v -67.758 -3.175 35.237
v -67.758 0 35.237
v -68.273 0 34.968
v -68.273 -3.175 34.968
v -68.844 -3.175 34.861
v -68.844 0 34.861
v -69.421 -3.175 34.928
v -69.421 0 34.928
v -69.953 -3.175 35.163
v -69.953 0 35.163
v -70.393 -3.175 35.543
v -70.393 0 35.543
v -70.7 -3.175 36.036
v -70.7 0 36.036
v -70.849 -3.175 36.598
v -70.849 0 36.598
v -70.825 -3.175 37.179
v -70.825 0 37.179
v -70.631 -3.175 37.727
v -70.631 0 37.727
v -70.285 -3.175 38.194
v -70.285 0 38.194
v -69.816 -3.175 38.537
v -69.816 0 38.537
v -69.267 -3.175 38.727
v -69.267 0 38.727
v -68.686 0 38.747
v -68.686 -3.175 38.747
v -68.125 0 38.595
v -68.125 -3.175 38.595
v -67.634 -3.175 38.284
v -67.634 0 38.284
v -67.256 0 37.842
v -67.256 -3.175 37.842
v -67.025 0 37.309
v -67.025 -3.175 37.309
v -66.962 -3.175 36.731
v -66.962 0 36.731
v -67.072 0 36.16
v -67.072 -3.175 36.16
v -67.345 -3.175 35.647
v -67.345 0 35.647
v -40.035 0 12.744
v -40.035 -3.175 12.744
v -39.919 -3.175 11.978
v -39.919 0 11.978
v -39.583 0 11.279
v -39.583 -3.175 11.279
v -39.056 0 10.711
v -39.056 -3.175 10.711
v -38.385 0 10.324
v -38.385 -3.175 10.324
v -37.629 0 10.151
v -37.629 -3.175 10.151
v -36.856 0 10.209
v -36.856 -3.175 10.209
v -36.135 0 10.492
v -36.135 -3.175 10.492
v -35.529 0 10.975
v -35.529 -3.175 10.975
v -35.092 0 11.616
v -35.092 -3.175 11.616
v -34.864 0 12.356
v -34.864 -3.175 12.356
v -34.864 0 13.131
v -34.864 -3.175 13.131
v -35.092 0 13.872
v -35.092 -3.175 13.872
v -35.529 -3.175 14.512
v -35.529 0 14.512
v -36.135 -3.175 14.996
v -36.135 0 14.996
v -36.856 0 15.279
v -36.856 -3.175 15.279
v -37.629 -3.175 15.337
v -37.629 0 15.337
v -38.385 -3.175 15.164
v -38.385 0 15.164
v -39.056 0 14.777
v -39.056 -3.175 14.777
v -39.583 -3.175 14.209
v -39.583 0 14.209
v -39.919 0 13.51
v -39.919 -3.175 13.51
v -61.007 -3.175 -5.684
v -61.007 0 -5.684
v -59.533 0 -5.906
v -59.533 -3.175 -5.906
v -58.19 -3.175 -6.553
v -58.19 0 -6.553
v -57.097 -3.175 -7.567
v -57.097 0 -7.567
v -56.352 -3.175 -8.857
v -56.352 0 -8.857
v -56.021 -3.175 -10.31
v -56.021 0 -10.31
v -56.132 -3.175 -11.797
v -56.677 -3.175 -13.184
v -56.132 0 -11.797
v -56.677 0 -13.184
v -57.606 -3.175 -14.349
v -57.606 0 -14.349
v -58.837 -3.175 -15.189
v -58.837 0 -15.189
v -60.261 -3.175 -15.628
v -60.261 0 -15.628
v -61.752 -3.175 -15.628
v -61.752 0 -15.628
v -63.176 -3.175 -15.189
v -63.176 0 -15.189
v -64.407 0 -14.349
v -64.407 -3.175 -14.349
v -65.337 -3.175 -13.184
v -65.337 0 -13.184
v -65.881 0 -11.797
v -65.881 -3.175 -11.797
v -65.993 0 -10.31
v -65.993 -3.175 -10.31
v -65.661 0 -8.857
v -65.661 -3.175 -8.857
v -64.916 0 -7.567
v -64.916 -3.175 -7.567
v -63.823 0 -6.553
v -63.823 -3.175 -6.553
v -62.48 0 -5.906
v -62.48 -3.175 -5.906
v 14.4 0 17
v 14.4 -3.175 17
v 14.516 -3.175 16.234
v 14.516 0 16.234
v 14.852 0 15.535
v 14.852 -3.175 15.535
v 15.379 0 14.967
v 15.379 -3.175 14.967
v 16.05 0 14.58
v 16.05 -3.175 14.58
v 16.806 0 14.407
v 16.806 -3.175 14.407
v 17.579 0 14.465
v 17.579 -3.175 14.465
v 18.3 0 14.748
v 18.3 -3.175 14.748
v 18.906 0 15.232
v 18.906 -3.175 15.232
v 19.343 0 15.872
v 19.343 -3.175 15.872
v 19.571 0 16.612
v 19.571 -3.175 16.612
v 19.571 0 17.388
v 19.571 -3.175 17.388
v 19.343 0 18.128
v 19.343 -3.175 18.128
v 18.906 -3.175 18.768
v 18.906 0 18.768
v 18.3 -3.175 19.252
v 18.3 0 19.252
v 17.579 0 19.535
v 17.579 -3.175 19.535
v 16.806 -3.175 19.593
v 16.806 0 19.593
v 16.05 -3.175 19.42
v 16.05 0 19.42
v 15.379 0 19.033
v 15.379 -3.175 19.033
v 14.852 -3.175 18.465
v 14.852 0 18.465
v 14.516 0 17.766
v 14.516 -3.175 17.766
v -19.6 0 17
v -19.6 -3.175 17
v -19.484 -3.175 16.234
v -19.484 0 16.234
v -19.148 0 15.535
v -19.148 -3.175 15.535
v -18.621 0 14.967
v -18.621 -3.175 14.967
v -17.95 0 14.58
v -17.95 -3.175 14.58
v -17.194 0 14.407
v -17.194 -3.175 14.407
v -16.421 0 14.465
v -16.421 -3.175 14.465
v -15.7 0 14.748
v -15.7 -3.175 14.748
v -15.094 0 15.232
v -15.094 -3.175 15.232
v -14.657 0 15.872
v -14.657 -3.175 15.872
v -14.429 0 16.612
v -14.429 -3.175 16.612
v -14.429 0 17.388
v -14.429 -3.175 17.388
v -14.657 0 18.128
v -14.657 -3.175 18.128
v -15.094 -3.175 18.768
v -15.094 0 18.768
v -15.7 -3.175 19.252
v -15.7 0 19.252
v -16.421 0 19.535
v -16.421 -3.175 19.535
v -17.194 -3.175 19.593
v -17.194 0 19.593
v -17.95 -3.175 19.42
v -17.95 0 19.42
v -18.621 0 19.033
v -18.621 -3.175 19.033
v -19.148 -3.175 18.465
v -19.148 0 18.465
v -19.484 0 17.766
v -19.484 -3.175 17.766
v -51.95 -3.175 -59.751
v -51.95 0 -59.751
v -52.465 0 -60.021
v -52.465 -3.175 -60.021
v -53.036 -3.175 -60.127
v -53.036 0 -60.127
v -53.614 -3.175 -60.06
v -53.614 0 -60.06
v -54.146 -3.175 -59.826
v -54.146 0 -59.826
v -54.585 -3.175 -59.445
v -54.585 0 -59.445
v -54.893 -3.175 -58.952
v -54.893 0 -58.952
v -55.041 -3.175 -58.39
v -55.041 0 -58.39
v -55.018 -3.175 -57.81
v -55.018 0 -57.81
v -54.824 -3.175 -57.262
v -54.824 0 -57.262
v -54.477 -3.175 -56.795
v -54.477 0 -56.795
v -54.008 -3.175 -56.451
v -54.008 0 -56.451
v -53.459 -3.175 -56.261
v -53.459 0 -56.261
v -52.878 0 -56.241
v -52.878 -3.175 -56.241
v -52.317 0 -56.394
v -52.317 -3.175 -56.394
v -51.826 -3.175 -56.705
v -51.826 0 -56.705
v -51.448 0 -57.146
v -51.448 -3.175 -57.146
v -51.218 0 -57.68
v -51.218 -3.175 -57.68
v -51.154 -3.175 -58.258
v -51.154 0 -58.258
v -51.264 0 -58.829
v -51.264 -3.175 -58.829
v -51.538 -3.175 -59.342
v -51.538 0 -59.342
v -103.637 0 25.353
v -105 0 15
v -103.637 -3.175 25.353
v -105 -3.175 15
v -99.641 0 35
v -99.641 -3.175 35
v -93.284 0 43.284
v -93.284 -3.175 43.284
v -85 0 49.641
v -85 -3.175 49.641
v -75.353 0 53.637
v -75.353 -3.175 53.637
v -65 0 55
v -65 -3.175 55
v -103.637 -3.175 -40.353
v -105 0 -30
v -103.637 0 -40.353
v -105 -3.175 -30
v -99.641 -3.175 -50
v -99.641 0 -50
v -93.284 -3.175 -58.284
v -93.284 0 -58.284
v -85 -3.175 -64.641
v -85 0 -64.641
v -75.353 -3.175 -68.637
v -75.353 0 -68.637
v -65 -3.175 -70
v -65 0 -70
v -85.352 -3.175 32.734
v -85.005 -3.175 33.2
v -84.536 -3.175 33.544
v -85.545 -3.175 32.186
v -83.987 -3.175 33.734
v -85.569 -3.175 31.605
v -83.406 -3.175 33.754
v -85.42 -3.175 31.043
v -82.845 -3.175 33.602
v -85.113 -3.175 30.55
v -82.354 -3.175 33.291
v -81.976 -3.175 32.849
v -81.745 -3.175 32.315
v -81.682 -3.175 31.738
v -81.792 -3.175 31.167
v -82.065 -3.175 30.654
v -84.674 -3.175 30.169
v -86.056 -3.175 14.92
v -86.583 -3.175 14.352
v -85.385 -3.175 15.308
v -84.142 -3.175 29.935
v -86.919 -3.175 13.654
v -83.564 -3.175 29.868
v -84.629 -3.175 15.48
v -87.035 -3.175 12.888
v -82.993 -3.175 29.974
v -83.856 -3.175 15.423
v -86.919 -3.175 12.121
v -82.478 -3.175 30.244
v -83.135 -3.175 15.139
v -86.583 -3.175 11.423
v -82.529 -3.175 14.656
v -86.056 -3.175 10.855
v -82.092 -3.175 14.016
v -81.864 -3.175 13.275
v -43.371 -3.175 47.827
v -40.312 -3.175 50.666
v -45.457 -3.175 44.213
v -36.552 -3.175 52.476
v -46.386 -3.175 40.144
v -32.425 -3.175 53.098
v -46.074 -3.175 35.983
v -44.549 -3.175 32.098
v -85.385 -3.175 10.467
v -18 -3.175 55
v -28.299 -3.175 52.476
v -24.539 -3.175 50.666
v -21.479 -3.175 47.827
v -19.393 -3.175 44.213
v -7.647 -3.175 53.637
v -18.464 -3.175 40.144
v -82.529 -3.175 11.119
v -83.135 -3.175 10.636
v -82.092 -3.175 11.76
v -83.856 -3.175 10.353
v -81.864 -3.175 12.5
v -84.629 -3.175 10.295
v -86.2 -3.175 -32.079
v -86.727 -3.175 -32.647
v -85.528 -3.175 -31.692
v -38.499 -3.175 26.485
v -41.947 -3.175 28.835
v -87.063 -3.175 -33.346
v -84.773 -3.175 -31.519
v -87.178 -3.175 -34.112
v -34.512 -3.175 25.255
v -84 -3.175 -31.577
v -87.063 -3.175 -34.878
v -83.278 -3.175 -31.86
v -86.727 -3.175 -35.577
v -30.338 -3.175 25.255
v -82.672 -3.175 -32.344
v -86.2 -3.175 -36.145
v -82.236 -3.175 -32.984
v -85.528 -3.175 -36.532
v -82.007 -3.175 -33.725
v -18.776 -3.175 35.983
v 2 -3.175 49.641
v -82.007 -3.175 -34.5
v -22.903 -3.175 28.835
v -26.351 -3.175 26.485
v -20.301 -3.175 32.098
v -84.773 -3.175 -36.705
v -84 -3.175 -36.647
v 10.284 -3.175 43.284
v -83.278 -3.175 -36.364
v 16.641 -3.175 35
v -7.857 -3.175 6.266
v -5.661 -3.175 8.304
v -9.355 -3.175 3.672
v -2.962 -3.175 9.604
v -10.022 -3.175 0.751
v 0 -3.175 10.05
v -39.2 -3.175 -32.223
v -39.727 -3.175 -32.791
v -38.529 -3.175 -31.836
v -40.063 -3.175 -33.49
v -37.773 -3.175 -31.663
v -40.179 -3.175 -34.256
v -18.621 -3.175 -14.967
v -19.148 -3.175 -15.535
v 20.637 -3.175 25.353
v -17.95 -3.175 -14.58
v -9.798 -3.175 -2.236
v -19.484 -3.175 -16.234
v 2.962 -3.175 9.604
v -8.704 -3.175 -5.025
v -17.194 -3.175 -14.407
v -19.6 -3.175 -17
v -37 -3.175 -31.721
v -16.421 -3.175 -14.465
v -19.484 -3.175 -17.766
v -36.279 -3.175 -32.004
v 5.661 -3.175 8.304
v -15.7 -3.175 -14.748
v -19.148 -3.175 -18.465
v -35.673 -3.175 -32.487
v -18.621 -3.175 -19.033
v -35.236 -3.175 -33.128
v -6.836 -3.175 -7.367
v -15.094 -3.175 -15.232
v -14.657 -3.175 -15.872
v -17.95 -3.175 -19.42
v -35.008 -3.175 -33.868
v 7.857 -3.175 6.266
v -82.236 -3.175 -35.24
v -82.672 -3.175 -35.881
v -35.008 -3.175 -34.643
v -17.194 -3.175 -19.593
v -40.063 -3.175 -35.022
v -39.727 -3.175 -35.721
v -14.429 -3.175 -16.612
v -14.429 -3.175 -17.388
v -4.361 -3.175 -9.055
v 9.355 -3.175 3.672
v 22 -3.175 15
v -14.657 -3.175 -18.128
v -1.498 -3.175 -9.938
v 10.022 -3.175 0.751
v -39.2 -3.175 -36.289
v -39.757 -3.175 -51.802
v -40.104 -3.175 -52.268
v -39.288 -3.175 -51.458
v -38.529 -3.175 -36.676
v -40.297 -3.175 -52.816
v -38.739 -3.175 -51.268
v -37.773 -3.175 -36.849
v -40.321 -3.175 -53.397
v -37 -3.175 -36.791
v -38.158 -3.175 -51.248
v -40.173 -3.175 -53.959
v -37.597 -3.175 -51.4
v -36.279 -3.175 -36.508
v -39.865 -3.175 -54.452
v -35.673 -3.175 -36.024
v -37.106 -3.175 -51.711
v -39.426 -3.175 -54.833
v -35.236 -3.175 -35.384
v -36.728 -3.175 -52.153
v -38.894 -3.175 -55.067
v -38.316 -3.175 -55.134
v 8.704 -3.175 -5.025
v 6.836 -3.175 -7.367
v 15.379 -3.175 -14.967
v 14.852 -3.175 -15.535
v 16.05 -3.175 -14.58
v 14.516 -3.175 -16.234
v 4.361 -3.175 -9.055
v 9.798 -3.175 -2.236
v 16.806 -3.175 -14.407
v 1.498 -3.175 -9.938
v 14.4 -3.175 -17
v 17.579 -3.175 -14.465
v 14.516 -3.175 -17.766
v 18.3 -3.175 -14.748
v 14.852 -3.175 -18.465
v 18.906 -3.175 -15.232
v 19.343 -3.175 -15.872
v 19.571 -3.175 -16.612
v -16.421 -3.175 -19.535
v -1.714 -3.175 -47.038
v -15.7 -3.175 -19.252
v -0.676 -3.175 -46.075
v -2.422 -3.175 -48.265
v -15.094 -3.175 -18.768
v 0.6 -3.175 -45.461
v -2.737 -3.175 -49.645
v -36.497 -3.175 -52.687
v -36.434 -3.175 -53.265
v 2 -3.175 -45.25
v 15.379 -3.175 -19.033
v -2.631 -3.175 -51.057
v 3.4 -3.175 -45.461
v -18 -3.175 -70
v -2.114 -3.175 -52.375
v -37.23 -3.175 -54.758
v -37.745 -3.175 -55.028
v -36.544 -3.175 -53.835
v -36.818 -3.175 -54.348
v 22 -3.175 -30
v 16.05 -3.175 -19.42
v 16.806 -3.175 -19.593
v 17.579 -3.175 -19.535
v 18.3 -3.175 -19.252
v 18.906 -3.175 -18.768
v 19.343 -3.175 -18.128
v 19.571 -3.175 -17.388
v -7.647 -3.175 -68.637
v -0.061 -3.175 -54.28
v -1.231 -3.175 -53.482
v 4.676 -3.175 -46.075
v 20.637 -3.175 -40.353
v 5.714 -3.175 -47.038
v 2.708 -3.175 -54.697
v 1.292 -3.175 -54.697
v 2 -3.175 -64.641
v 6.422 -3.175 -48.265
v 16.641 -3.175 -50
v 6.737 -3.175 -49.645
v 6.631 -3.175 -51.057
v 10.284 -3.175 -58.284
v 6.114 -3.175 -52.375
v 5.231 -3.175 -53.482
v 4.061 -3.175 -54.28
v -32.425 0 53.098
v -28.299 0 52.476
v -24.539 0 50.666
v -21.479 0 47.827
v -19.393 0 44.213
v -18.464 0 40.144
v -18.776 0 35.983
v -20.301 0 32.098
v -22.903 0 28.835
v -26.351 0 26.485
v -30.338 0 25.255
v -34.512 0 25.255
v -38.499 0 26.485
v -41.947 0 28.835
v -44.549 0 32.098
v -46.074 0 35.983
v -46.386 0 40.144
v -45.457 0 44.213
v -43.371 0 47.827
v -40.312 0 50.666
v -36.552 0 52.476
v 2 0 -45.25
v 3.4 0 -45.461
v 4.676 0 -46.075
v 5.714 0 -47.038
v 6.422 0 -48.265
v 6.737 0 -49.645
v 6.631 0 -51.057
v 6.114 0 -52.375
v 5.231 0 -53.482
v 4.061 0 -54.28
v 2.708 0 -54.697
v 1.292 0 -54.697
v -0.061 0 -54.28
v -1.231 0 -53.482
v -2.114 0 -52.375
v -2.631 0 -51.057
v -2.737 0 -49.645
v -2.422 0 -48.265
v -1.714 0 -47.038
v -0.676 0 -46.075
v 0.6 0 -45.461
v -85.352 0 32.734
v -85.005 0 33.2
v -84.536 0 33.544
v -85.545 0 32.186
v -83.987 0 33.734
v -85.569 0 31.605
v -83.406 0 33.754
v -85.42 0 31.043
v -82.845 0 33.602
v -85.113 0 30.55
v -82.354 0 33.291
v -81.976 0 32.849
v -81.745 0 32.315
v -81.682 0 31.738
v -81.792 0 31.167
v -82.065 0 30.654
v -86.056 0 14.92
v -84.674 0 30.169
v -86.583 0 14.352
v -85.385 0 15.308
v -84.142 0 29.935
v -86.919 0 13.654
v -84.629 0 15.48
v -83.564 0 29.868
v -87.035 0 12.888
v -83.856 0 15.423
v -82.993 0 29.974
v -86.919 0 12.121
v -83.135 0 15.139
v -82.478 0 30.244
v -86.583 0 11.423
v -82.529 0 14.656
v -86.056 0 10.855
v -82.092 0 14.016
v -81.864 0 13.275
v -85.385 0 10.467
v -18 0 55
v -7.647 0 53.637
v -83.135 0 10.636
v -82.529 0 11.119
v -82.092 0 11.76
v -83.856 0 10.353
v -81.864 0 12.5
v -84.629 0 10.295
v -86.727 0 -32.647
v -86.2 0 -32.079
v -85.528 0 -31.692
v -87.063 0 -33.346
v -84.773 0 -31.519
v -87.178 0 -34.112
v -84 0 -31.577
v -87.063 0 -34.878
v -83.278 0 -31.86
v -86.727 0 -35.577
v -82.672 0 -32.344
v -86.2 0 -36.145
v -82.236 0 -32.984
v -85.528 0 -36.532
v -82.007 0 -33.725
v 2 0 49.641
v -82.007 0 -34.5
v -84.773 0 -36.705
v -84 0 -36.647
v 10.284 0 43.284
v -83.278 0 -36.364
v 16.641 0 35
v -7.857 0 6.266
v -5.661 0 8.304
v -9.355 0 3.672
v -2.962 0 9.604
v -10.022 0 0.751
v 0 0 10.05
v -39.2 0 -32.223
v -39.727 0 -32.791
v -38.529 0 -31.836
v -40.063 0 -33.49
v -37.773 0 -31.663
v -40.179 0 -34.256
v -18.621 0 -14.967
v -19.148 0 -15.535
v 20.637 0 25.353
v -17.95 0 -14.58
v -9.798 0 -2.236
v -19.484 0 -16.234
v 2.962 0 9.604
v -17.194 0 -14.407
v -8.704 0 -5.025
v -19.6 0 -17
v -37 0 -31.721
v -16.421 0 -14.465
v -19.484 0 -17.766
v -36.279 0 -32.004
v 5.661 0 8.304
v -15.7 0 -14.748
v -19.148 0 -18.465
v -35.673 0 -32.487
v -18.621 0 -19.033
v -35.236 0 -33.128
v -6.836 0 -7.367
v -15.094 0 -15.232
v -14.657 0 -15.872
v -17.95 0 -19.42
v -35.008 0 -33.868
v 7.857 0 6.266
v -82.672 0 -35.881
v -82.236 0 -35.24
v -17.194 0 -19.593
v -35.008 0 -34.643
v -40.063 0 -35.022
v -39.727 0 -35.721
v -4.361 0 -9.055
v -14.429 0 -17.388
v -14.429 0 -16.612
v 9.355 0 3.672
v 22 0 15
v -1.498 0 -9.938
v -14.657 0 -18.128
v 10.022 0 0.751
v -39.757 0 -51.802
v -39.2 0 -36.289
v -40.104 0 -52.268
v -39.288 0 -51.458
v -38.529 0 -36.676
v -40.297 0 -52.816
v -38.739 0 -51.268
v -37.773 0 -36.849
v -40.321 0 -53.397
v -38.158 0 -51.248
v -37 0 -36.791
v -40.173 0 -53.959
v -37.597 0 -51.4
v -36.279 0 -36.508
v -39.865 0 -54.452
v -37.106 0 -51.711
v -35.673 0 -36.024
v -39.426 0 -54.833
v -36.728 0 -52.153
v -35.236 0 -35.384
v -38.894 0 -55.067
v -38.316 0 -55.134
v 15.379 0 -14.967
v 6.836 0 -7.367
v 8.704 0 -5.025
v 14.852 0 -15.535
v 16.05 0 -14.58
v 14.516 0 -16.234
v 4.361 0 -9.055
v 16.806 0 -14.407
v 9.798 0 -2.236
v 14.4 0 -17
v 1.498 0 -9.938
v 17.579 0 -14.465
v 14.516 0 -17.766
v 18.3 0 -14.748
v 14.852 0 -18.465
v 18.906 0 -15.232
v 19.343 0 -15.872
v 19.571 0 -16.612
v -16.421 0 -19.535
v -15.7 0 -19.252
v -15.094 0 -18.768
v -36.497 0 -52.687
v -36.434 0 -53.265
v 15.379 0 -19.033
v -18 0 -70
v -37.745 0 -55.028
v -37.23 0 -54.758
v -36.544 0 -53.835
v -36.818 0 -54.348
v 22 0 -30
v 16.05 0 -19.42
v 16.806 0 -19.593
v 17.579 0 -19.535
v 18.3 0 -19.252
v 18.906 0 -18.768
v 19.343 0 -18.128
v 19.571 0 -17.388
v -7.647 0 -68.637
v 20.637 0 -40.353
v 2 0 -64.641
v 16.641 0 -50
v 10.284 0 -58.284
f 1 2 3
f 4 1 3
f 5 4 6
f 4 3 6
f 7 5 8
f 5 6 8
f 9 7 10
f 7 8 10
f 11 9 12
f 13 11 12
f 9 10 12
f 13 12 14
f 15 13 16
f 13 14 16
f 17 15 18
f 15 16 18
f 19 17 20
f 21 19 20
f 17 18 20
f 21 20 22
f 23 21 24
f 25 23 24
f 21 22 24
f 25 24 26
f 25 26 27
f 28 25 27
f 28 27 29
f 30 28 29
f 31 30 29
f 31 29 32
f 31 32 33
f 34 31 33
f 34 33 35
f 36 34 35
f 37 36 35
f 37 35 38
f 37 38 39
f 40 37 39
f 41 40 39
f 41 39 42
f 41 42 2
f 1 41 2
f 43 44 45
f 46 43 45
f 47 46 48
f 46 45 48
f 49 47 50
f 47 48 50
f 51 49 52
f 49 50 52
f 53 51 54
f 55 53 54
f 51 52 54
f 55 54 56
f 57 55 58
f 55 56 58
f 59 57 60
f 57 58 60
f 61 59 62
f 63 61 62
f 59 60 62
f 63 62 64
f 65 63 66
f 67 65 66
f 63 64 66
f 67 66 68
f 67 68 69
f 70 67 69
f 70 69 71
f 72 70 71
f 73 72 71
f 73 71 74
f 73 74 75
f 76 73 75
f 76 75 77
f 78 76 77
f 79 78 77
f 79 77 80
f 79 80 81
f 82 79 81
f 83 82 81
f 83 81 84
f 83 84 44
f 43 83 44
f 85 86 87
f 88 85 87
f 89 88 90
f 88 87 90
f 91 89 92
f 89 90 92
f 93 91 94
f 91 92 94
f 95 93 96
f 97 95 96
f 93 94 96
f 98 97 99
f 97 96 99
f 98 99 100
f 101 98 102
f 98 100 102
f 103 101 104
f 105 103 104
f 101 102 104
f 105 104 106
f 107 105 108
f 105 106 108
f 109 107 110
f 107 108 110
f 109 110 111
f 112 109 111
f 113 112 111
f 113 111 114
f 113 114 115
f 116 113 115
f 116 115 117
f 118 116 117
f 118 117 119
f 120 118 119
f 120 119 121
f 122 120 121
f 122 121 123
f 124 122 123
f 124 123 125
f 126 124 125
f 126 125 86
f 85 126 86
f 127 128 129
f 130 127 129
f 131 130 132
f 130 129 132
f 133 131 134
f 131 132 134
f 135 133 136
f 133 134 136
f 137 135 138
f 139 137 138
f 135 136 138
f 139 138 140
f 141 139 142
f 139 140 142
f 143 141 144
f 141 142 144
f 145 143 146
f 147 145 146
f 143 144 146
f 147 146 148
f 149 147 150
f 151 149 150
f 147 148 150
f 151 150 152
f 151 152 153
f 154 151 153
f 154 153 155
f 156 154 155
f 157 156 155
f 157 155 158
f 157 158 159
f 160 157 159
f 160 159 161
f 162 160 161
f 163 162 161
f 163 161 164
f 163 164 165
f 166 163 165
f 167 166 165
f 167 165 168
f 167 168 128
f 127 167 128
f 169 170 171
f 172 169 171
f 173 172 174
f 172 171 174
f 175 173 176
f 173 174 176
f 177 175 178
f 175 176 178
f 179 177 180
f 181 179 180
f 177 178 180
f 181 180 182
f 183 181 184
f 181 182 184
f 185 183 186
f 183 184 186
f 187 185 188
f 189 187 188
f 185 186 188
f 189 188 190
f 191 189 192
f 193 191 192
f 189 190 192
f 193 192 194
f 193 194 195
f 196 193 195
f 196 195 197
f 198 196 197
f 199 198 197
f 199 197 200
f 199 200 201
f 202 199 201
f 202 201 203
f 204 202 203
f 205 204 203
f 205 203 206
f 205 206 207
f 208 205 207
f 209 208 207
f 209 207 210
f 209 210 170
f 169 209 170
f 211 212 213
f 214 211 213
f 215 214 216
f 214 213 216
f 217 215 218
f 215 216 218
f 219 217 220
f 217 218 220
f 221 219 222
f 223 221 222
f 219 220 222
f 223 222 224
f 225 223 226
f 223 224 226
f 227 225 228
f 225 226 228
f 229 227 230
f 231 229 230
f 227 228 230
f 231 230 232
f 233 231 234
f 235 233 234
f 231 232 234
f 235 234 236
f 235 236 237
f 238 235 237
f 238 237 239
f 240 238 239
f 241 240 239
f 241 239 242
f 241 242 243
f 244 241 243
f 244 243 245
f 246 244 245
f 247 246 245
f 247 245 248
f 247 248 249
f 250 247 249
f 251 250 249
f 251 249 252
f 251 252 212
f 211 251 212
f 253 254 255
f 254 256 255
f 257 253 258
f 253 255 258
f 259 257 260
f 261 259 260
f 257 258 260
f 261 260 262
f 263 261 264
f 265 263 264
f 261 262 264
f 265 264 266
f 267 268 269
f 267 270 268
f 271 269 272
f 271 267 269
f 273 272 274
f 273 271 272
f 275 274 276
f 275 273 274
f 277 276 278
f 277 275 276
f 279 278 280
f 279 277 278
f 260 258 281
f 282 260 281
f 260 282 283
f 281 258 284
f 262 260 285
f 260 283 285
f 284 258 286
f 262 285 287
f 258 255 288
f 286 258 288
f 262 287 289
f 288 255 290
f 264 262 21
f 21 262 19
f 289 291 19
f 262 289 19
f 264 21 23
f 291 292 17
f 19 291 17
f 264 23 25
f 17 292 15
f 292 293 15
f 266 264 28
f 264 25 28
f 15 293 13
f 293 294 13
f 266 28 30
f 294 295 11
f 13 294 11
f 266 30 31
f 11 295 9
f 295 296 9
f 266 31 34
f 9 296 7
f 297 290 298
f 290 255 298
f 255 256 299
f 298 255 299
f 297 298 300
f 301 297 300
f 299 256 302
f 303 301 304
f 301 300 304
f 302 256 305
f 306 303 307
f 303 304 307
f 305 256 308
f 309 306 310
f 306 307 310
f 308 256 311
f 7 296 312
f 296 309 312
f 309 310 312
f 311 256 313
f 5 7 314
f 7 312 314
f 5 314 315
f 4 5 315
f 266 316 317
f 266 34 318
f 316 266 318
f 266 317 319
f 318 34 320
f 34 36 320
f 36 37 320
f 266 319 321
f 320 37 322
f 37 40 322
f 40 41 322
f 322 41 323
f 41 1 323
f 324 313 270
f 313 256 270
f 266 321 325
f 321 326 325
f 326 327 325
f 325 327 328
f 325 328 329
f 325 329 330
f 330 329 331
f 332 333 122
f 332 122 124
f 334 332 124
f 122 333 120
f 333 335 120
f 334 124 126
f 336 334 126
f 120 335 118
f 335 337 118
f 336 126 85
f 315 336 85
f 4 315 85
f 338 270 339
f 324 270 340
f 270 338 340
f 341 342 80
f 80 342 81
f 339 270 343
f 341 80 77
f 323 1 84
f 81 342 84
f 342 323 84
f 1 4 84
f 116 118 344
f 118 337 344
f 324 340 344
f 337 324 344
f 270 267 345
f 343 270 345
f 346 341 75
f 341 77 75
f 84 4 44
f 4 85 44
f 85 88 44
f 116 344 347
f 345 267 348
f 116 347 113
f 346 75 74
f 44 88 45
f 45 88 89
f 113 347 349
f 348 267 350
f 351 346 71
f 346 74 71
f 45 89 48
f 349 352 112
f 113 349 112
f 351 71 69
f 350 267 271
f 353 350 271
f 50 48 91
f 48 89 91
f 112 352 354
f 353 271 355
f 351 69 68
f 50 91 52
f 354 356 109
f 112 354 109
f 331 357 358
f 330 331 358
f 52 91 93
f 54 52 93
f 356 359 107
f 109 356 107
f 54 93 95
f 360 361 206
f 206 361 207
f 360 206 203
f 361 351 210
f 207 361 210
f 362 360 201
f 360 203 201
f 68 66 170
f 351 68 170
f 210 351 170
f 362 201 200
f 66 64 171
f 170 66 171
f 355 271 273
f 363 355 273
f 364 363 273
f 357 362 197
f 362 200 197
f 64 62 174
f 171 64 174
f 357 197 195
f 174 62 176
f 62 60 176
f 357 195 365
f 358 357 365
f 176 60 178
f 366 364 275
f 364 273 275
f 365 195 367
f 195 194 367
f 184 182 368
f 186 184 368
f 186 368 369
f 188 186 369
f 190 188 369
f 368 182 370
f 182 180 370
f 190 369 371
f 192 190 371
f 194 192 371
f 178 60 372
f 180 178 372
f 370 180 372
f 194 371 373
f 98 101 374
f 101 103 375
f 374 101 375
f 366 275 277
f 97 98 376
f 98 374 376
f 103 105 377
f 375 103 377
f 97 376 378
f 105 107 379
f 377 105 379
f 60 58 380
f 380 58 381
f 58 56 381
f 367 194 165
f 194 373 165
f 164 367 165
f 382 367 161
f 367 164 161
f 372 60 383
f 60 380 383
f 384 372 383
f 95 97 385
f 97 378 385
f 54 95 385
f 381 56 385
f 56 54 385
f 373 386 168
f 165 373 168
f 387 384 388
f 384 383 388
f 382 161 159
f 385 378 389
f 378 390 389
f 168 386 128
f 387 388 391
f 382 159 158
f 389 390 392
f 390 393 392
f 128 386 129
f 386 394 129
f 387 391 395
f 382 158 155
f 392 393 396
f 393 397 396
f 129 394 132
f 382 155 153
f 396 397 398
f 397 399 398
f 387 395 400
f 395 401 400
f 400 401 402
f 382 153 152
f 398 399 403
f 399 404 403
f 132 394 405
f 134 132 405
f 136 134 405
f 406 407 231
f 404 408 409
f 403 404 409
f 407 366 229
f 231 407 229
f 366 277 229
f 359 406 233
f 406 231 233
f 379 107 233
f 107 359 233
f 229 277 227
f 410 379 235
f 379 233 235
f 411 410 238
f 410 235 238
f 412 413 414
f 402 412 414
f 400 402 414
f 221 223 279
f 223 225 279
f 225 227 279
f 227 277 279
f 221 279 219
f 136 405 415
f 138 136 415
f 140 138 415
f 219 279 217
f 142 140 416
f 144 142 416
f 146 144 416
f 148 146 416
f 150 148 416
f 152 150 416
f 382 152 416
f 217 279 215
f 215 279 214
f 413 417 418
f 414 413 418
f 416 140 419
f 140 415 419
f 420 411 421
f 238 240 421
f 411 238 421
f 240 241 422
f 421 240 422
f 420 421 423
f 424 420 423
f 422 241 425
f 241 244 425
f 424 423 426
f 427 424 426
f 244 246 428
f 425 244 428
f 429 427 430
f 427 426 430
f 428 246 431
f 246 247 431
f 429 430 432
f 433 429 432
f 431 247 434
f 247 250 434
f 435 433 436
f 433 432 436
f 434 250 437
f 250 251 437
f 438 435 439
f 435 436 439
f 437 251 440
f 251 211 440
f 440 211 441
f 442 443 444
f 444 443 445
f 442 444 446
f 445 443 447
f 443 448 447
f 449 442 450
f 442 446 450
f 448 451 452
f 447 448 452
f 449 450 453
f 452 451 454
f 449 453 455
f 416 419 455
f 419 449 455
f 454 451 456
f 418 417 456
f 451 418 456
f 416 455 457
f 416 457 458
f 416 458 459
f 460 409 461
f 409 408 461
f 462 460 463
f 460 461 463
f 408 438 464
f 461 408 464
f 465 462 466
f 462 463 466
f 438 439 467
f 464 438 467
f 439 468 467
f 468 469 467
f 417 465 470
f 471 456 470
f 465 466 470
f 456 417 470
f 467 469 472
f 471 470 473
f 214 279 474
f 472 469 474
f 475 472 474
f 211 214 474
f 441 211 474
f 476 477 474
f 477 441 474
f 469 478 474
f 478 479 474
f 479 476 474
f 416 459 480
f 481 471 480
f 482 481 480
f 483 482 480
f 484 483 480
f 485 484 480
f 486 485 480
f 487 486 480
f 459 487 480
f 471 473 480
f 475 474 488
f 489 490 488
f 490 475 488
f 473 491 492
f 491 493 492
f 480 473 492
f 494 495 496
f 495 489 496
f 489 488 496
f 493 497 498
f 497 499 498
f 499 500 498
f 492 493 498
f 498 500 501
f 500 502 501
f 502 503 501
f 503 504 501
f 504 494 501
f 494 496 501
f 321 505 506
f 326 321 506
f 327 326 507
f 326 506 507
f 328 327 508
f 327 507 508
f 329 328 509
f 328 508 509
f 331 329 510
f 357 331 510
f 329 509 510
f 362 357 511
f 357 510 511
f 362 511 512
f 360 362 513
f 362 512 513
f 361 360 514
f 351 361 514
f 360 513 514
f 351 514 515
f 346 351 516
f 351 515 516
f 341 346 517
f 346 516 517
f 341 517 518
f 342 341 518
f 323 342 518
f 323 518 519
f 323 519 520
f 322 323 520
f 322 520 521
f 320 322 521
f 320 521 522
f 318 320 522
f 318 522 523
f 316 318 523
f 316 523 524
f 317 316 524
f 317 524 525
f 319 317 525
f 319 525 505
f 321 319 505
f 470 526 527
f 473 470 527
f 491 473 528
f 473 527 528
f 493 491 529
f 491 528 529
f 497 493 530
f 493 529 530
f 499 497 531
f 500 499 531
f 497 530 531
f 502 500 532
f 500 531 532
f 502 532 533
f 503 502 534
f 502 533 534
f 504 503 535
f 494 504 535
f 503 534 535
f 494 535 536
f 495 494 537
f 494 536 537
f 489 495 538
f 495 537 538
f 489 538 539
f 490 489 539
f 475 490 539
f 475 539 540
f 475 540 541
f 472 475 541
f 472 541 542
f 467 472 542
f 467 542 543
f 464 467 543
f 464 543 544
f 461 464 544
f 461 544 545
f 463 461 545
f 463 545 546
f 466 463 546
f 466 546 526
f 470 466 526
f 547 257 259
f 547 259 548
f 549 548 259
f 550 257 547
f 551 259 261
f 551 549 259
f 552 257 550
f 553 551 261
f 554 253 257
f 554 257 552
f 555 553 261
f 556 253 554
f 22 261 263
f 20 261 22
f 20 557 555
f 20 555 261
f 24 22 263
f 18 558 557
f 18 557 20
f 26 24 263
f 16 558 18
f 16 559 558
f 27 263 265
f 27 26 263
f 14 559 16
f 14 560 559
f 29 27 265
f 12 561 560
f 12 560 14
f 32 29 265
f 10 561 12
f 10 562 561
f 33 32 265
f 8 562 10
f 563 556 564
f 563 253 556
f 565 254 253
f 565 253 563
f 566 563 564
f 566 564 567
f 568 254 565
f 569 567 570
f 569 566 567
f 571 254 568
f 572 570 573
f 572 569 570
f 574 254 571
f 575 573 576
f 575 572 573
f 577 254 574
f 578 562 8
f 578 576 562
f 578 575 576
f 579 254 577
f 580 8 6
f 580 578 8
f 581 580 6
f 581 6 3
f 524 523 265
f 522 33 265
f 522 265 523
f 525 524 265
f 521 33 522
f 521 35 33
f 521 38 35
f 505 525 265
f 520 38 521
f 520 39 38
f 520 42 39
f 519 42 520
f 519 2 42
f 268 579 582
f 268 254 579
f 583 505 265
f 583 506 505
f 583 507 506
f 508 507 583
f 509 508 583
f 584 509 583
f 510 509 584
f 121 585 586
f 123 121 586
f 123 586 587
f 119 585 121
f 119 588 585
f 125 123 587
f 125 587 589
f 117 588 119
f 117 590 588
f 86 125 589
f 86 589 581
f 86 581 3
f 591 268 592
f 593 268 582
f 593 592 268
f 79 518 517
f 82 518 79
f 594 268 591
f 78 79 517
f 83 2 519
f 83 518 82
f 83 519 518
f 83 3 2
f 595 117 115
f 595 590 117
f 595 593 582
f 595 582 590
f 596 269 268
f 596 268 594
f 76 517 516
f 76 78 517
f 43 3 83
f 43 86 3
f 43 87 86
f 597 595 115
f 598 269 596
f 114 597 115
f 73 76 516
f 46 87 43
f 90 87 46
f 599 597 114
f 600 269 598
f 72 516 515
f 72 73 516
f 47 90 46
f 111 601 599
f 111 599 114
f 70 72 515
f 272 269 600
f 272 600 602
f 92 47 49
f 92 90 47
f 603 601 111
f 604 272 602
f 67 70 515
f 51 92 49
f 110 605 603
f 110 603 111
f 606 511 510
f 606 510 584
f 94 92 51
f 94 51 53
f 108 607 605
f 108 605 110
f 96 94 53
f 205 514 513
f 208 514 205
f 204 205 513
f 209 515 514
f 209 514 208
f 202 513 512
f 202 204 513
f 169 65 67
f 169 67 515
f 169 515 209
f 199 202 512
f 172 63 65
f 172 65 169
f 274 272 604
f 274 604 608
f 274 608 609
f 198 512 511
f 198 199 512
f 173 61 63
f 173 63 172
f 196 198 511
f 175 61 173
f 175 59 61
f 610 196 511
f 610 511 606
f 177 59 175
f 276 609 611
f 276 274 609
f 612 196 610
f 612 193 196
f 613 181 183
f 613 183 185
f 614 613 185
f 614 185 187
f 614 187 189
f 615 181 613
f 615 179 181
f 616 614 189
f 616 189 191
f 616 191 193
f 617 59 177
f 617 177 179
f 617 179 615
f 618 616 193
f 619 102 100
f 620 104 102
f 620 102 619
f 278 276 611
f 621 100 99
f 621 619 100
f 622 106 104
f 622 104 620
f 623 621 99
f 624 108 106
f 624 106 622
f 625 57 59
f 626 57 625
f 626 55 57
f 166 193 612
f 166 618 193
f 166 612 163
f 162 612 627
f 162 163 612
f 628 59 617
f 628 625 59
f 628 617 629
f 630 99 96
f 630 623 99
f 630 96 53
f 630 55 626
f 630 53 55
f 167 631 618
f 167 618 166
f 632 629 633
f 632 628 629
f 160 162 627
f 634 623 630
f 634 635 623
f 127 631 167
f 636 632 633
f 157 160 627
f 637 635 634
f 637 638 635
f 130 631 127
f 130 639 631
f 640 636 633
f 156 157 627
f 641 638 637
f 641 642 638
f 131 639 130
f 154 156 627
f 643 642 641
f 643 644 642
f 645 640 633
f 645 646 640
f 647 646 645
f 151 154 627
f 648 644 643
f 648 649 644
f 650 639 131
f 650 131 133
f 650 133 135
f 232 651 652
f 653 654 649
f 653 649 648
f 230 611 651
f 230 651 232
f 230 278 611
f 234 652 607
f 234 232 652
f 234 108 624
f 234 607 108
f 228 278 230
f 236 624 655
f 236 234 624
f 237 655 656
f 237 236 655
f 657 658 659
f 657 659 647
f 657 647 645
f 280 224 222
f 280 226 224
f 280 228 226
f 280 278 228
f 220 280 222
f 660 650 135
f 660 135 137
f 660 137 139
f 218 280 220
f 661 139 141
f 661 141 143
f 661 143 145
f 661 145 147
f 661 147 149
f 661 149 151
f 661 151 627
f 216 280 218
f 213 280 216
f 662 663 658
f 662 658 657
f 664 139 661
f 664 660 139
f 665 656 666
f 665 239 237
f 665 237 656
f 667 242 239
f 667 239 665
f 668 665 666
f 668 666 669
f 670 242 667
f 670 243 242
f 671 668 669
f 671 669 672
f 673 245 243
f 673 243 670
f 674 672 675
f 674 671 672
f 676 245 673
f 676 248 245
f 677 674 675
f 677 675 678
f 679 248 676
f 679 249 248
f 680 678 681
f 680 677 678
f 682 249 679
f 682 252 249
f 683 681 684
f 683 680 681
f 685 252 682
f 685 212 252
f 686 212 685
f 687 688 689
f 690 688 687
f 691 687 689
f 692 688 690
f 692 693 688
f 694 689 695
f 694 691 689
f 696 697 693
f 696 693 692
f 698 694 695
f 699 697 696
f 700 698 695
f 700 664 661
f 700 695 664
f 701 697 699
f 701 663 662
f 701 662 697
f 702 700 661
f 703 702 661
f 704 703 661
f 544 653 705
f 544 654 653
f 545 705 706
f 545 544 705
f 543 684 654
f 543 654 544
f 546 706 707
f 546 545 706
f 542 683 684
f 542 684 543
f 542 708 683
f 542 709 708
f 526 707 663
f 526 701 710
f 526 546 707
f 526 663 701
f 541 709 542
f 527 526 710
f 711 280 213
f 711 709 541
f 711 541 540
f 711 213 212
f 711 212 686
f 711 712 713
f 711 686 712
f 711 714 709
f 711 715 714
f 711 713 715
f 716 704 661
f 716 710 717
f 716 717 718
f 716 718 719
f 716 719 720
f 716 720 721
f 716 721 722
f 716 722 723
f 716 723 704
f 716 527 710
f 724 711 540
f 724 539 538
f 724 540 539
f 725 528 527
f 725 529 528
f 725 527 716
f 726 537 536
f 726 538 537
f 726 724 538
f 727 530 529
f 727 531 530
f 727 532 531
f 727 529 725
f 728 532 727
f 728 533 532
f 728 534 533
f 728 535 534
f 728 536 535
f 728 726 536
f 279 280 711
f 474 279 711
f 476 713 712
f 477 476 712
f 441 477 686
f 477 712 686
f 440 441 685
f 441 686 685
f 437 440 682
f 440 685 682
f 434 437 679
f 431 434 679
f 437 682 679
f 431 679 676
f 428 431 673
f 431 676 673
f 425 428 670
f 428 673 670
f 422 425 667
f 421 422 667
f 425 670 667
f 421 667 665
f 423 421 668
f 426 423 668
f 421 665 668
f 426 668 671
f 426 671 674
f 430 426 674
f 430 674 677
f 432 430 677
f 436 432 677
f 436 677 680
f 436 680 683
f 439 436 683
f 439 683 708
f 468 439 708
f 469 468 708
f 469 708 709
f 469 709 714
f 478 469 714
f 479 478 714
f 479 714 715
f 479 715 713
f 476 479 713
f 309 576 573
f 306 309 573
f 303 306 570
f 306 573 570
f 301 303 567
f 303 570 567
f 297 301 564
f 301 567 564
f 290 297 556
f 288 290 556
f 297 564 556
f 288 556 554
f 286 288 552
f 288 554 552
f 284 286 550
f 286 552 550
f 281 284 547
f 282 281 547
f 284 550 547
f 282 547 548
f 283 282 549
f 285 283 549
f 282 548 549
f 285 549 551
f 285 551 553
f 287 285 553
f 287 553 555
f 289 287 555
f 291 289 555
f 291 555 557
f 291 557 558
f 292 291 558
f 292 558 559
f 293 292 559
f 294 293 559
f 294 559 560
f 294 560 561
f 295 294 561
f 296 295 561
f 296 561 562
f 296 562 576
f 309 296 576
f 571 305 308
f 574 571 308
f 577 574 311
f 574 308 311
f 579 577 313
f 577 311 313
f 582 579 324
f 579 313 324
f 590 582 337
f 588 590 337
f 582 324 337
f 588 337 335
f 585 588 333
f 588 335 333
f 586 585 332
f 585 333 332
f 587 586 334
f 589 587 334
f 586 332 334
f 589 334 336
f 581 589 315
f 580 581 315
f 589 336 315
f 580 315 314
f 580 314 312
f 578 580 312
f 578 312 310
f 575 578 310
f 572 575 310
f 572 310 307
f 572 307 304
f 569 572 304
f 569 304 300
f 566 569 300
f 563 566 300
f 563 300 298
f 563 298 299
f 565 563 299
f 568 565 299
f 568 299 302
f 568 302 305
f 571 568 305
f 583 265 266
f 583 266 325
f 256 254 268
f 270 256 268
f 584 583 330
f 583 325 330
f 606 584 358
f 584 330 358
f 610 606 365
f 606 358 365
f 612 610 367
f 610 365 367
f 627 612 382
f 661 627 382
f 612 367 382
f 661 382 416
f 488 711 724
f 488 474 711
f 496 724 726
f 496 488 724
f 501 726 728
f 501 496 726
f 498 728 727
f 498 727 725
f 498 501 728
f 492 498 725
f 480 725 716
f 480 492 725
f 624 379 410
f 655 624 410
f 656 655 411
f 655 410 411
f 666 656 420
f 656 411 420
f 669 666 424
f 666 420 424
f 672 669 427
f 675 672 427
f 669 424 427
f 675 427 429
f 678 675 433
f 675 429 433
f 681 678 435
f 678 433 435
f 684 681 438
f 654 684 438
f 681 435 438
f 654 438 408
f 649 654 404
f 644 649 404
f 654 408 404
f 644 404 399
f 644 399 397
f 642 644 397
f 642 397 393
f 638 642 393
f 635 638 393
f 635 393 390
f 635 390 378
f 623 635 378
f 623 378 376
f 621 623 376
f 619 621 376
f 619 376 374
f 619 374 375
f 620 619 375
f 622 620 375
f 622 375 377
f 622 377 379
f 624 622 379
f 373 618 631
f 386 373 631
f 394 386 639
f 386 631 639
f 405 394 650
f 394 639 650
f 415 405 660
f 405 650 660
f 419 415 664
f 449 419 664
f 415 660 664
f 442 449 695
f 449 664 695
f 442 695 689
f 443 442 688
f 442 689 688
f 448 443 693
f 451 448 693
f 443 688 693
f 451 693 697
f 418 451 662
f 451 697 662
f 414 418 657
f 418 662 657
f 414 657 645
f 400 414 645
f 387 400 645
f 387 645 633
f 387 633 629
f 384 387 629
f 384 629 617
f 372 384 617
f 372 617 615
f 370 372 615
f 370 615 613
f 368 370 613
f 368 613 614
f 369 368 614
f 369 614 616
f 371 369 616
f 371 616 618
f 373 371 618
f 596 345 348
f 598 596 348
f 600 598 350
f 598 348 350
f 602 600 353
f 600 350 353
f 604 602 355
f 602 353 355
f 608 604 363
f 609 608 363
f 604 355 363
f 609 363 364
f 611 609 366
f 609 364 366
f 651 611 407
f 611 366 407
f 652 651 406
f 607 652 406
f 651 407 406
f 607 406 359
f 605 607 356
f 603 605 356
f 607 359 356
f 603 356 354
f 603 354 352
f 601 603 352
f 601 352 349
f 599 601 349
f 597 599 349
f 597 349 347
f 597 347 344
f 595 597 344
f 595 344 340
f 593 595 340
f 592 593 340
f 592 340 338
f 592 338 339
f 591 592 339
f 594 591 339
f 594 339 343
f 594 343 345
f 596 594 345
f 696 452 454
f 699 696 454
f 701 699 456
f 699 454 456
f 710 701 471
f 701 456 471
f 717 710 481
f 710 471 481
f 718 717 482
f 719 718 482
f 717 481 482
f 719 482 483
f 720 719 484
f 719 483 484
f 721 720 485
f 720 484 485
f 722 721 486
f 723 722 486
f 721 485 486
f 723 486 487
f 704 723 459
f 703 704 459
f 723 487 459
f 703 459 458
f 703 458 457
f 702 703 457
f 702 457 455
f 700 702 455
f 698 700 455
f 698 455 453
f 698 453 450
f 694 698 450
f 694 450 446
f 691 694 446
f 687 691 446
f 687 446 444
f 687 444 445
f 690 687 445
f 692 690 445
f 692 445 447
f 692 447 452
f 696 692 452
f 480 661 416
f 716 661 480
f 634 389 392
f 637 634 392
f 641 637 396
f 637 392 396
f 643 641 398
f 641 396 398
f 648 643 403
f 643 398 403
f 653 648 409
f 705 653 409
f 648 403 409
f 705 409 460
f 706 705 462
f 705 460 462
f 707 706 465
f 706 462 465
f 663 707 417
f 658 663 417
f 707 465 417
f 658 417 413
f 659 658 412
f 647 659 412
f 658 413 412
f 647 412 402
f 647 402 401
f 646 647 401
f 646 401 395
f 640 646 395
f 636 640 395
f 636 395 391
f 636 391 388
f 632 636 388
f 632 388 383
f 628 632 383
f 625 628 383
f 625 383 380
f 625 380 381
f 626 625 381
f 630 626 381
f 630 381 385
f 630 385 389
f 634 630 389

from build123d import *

# Parameters (mm, degrees)
CROQUIS1_W                     = 127
CROQUIS1_H                     = 125
BRIDA_BASE1_DEPTH              = 3.175
CROQUIS11_R                    = 10.05
CORTAR_EXTRUIR3_DEPTH          = 10
TALADRO_DE_MARGEN_PARA_M51_D   = 5.2
TALADRO_DE_MARGEN_PARA_M52_D   = 5.2
CROQUIS16_R                    = 5
CORTAR_EXTRUIR4_DEPTH          = 127.234229213
CROQUIS17_R                    = 14
CROQUIS17_R_2                  = 4.75
CORTAR_EXTRUIR5_DEPTH          = 10
TALADRO_DE_MARGEN_PARA_M3_51_D = 3.9
REDONDEO1_R                    = 40


# Sheet-metal steps are written as plain solids
with BuildPart() as part:
    # Croquis1 → Brida base1 (new body)
    with BuildSketch(Plane(origin=(0, 0, 0), x_dir=(1, 0, 0), z_dir=(0, 1, 0))):
        with Locations((-41.5, 7.5)):
            Rectangle(CROQUIS1_W, CROQUIS1_H)
    extrude(amount=-BRIDA_BASE1_DEPTH)

    # Croquis11 → Cortar-Extruir3 (cut)
    with BuildSketch(Plane(origin=(0, 0, 0), x_dir=(1, 0, 0), z_dir=(0, 1, 0))):
        with Locations(Location((0, 0, 0), (0, 0, 270))):
            Circle(CROQUIS11_R)
    extrude(amount=-CORTAR_EXTRUIR3_DEPTH, mode=Mode.SUBTRACT)

    # Taladro de margen para M51 (through all)
    with Locations(Plane(origin=(0, 0, 0), x_dir=(1, 0, 0), z_dir=(0, 1, 0))):
        with Locations((17, 17), (-17, 17), (-17, -17), (17, -17)):
            Hole(TALADRO_DE_MARGEN_PARA_M51_D / 2)

    # Taladro de margen para M52 (through all)
    with Locations(Plane(origin=(0, 0, 0), x_dir=(1, 0, 0), z_dir=(0, 1, 0))):
        with Locations((-37.578650523, 34.25587131), (-37.434837835, -12.743908668), (-84.434617812, -12.887721356), (-84.578430501, 34.112058621), (-61.006634168, 10.684074977)):
            Hole(TALADRO_DE_MARGEN_PARA_M52_D / 2)

    # Croquis16 → Cortar-Extruir4 (cut, through all)
    with BuildSketch(Plane(origin=(0, 0, 0), x_dir=(1, 0, 0), z_dir=(0, 1, 0))):
        with Locations(Location((-61.006634168, 10.684074977, 0), (0, 0, 270))):
            Circle(CROQUIS16_R)
    extrude(amount=-CORTAR_EXTRUIR4_DEPTH, mode=Mode.SUBTRACT)

    # Croquis17 → Cortar-Extruir5 (cut)
    with BuildSketch(Plane(origin=(0, 0, 0), x_dir=(1, 0, 0), z_dir=(0, 1, 0))):
        with Locations(Location((-32.425079896, -39.098203149, 0), (0, 0, 270))):
            Circle(CROQUIS17_R)
        with Locations(Location((2, 50, 0), (0, 0, 270))):
            Circle(CROQUIS17_R_2)
    extrude(amount=-CORTAR_EXTRUIR5_DEPTH, mode=Mode.SUBTRACT)

    # Taladro de margen para M3.51 (through all)
    with Locations(Plane(origin=(-235.296017462, -6.288, -137.590485756), x_dir=(-0.5911403395410236, 0, 0.806568719308729), z_dir=(0, -1, 0))):
        with Locations((46.983235392, -222.472189169), (42.30898943, -237.296741799), (-48.324723402, -208.719537692), (-43.650477439, -193.894985062)):
            Hole(TALADRO_DE_MARGEN_PARA_M3_51_D / 2)

    # Redondeo1
    redondeo1_edges = [part.edges().sort_by_distance(p)[0] for p in [
        (22, -1.5875, 55),
        (-105, -1.5875, 55),
        (-105, -1.5875, -70),
        (22, -1.5875, -70),
    ]]
    fillet(redondeo1_edges, radius=REDONDEO1_R)


solid = part.part
